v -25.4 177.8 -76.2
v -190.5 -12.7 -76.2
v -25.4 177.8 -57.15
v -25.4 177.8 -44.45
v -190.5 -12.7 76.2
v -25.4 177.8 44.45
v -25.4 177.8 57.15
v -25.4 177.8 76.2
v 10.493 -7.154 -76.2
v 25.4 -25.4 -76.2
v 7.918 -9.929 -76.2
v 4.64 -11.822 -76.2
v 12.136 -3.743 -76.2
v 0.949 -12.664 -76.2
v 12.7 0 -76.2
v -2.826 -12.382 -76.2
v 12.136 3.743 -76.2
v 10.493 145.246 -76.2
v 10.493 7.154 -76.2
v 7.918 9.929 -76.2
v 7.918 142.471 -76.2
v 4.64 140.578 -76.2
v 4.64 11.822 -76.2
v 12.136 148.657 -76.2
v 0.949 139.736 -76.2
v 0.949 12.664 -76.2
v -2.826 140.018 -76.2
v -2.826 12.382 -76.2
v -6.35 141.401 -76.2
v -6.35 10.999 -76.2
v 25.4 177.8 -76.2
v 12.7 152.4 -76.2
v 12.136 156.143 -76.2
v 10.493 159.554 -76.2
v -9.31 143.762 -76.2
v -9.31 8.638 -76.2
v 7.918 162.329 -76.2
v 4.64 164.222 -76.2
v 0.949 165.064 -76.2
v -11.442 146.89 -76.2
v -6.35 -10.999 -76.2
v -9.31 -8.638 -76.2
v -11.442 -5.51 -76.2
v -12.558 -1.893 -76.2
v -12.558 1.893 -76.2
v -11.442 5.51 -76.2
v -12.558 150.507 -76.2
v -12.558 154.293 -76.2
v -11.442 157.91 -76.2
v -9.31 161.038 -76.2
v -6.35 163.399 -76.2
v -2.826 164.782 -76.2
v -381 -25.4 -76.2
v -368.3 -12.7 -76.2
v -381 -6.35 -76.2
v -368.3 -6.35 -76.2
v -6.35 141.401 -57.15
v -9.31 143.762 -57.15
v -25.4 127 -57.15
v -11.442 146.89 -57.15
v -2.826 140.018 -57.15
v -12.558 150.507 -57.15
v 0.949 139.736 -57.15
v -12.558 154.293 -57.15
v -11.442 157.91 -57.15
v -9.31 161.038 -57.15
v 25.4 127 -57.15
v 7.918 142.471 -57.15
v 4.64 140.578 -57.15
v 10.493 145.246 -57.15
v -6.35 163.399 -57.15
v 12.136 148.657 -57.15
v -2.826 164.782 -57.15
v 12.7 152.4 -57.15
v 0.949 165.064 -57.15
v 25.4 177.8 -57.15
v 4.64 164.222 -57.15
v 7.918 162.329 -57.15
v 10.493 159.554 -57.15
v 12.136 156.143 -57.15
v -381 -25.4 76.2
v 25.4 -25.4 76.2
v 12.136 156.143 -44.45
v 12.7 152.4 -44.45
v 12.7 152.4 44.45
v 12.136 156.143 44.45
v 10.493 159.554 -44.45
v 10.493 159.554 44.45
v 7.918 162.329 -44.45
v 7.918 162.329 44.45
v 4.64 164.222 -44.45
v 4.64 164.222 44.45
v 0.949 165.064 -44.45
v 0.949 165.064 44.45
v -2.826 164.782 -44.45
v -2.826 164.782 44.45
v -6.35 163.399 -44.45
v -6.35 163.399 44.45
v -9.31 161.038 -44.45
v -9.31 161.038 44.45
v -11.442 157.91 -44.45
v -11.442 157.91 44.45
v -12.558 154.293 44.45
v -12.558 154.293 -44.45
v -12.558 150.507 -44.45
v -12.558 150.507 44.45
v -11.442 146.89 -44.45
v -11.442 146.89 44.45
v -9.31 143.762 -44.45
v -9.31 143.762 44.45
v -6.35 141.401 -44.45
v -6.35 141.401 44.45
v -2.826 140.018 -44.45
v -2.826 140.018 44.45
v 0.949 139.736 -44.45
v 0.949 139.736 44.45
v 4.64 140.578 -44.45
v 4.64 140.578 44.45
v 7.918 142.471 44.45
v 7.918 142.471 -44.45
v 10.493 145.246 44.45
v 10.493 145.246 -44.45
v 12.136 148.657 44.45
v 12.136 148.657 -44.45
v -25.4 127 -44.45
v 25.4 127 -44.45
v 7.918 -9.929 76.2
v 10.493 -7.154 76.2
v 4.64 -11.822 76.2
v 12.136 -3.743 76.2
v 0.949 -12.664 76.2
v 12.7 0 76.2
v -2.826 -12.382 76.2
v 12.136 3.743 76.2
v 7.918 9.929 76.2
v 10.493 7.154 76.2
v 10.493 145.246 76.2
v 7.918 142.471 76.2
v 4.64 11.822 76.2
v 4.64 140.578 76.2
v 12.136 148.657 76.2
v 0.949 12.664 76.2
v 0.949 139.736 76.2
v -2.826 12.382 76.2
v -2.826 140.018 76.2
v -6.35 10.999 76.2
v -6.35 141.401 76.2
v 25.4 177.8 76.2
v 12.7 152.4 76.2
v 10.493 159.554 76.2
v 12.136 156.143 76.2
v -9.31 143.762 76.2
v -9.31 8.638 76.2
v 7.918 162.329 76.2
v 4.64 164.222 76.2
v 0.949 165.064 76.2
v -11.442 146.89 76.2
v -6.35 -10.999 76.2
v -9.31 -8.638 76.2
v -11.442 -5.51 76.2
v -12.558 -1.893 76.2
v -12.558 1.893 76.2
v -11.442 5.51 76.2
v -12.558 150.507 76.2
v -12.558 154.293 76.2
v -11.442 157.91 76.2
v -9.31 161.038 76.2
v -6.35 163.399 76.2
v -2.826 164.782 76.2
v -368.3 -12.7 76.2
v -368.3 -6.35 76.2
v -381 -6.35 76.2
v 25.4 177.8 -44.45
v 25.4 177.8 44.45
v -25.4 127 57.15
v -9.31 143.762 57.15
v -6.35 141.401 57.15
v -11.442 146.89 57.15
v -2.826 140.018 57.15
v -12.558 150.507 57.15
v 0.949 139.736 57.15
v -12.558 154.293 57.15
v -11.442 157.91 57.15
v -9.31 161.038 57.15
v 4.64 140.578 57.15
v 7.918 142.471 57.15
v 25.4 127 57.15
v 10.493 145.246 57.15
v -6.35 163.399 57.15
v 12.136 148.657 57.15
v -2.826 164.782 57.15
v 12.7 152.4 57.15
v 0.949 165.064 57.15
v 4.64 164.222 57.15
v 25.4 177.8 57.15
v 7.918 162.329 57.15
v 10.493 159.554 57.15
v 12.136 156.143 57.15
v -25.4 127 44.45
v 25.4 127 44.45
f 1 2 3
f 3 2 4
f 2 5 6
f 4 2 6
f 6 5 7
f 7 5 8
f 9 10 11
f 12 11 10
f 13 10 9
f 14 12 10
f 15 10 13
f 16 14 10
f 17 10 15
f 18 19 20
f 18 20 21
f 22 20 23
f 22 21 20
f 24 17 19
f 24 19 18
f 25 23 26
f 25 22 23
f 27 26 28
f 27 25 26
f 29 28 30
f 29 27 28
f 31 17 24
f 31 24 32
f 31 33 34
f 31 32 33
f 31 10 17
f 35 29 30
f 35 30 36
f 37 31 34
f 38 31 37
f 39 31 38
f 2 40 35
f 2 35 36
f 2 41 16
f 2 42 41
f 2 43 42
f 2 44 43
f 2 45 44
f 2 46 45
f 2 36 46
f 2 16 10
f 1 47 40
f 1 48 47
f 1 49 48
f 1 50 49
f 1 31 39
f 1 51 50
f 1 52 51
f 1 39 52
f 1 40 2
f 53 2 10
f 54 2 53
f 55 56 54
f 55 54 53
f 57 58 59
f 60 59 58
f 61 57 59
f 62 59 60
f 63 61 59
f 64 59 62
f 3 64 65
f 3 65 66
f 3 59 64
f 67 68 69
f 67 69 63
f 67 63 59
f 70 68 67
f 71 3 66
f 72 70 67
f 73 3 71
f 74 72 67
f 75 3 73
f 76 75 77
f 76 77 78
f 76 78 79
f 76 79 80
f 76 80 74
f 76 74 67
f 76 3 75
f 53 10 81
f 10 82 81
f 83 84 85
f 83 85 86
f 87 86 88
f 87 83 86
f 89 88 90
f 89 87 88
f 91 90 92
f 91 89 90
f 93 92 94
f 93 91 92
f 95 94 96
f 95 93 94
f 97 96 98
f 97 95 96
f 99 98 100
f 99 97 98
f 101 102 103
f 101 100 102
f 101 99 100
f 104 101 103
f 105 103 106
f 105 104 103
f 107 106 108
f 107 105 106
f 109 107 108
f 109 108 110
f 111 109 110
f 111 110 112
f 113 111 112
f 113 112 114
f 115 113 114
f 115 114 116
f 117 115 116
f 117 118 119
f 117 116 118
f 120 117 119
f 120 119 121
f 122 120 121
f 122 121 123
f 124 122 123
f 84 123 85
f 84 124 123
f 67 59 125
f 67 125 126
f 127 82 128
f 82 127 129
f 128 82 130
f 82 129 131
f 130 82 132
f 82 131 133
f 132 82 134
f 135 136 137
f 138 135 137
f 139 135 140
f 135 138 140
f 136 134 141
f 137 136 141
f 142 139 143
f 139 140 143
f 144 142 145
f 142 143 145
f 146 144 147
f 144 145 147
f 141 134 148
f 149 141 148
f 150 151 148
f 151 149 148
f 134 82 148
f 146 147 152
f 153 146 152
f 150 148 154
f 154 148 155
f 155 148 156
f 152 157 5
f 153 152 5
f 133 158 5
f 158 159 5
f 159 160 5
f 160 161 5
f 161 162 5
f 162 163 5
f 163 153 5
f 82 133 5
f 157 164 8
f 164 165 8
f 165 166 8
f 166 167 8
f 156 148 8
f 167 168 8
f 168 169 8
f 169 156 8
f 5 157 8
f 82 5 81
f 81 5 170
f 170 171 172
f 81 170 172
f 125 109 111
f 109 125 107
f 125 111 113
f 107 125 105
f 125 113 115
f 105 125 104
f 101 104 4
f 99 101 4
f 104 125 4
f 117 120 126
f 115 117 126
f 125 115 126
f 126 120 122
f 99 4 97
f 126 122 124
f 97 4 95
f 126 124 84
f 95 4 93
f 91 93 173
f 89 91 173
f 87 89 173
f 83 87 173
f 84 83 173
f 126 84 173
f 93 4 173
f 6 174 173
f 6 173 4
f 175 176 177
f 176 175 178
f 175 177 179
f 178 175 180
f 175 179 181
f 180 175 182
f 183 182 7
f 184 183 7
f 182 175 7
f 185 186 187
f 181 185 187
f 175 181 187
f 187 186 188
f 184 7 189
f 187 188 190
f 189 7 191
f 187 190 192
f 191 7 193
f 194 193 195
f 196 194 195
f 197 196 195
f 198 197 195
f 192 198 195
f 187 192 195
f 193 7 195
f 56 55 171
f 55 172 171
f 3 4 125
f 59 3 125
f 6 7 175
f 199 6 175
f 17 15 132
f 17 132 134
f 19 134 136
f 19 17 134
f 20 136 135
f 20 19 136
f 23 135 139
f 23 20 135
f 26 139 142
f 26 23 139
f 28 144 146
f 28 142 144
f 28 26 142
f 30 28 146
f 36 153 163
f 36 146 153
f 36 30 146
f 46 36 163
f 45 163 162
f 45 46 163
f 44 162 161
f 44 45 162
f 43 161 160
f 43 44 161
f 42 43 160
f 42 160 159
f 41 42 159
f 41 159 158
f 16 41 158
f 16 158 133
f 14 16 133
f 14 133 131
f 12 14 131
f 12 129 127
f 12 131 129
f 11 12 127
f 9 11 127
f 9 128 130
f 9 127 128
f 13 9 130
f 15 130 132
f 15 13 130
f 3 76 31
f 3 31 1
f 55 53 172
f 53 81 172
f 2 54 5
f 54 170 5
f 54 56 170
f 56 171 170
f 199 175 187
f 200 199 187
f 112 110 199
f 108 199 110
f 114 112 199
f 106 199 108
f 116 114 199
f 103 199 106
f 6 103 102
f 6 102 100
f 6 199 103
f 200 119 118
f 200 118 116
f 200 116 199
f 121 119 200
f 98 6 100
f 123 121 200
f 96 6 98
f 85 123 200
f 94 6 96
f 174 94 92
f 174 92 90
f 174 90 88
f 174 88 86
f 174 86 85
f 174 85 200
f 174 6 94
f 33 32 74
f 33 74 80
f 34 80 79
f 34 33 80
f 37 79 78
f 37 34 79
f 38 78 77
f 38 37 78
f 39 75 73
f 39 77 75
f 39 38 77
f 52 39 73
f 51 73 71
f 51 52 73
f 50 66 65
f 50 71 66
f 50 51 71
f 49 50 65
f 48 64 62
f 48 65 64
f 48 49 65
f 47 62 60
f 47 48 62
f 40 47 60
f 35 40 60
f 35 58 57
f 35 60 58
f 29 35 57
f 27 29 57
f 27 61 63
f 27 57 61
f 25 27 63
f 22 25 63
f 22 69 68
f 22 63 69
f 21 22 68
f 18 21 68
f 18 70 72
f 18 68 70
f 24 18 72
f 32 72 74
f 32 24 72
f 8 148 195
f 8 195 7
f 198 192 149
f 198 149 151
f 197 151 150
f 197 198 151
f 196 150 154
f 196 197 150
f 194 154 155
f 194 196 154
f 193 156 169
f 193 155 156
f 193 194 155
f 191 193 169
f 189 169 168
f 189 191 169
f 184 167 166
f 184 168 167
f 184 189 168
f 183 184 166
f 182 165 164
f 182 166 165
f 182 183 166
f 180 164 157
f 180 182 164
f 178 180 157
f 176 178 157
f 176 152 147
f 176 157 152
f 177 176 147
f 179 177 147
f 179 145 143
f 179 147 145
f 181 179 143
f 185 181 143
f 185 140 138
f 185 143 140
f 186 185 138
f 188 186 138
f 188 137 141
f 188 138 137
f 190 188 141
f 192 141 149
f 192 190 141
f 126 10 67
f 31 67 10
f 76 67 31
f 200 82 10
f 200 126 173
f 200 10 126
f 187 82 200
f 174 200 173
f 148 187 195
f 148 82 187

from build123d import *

# Parameters (mm, degrees)
SKETCH1_W               = 381
SKETCH1_H               = 25.4
SKETCH1_W_2             = 25.4
SKETCH1_H_2             = 152.4
BOSS_EXTRUDE1_DEPTH     = 76.2
CUT_EXTRUDE1_DEPTH      = 470.041106941
CUT_EXTRUDE1_DEPTH_BACK = 470.041106941
SKETCH2_R               = 12.7
SKETCH4_W               = 50.8
SKETCH4_H               = 50.8
CUT_EXTRUDE2_DEPTH      = 6.35
CUT_EXTRUDE3_DEPTH      = 451.089146725
CUT_EXTRUDE3_DEPTH_BACK = 451.089146725
SKETCH5_W               = 381
SKETCH5_H               = 25.4
BOSS_EXTRUDE2_DEPTH     = 76.2


with BuildPart() as part:
    # Sketch1 → Boss-Extrude1 (new, symmetric)
    with BuildSketch(Plane.XY):
        with Locations((-215.9, 12.7)):
            Rectangle(SKETCH1_W, SKETCH1_H)
        with Locations((-12.7, 76.2)):
            Rectangle(SKETCH1_W_2, SKETCH1_H_2)
        Polygon((0, 152.4), (0, 0), (-25.4, 0), (-25.4, -25.4), (25.4, -25.4), (25.4, 177.8), (-25.4, 177.8), (-25.4, 152.4), align=None)
    extrude(amount=BOSS_EXTRUDE1_DEPTH, both=True)

    # Sketch2 → Cut-Extrude1 (cut, two sides: drawn at the far end of the back side and taken through both)
    with BuildSketch(Plane.XY.offset(76.2).offset(-CUT_EXTRUDE1_DEPTH_BACK)):
        Circle(SKETCH2_R)
        with Locations((0, 152.4)):
            Circle(SKETCH2_R)
    extrude(amount=CUT_EXTRUDE1_DEPTH + CUT_EXTRUDE1_DEPTH_BACK, mode=Mode.SUBTRACT)

    # Sketch4 → Cut-Extrude2 (cut, symmetric)
    with BuildSketch(Plane.XY.offset(50.8)):
        with Locations((0, 152.4)):
            Rectangle(SKETCH4_W, SKETCH4_H)
    cut_extrude2 = extrude(amount=CUT_EXTRUDE2_DEPTH, both=True, mode=Mode.SUBTRACT)

    # Mirror1: Cut-Extrude2 across plane
    add(cut_extrude2.mirror(Plane.XY), mode=Mode.SUBTRACT)

    # Sketch5 → Cut-Extrude3 (cut, two sides: drawn at the far end of the back side and taken through both)
    with BuildSketch(Plane.XY.offset(-CUT_EXTRUDE3_DEPTH_BACK)):
        with Locations((-215.9, 12.7)):
            Rectangle(SKETCH5_W, SKETCH5_H)
    extrude(amount=CUT_EXTRUDE3_DEPTH + CUT_EXTRUDE3_DEPTH_BACK, mode=Mode.SUBTRACT)

    # Sketch6 → Boss-Extrude2 (add, symmetric)
    with BuildSketch(Plane.XY):
        Polygon((-25.4, -25.4), (-381, -25.4), (-381, -6.35), (-368.3, -6.35), (-368.3, -12.7), (-190.5, -12.7), (-25.4, 177.8), align=None)
    extrude(amount=BOSS_EXTRUDE2_DEPTH, both=True)


solid = part.part
